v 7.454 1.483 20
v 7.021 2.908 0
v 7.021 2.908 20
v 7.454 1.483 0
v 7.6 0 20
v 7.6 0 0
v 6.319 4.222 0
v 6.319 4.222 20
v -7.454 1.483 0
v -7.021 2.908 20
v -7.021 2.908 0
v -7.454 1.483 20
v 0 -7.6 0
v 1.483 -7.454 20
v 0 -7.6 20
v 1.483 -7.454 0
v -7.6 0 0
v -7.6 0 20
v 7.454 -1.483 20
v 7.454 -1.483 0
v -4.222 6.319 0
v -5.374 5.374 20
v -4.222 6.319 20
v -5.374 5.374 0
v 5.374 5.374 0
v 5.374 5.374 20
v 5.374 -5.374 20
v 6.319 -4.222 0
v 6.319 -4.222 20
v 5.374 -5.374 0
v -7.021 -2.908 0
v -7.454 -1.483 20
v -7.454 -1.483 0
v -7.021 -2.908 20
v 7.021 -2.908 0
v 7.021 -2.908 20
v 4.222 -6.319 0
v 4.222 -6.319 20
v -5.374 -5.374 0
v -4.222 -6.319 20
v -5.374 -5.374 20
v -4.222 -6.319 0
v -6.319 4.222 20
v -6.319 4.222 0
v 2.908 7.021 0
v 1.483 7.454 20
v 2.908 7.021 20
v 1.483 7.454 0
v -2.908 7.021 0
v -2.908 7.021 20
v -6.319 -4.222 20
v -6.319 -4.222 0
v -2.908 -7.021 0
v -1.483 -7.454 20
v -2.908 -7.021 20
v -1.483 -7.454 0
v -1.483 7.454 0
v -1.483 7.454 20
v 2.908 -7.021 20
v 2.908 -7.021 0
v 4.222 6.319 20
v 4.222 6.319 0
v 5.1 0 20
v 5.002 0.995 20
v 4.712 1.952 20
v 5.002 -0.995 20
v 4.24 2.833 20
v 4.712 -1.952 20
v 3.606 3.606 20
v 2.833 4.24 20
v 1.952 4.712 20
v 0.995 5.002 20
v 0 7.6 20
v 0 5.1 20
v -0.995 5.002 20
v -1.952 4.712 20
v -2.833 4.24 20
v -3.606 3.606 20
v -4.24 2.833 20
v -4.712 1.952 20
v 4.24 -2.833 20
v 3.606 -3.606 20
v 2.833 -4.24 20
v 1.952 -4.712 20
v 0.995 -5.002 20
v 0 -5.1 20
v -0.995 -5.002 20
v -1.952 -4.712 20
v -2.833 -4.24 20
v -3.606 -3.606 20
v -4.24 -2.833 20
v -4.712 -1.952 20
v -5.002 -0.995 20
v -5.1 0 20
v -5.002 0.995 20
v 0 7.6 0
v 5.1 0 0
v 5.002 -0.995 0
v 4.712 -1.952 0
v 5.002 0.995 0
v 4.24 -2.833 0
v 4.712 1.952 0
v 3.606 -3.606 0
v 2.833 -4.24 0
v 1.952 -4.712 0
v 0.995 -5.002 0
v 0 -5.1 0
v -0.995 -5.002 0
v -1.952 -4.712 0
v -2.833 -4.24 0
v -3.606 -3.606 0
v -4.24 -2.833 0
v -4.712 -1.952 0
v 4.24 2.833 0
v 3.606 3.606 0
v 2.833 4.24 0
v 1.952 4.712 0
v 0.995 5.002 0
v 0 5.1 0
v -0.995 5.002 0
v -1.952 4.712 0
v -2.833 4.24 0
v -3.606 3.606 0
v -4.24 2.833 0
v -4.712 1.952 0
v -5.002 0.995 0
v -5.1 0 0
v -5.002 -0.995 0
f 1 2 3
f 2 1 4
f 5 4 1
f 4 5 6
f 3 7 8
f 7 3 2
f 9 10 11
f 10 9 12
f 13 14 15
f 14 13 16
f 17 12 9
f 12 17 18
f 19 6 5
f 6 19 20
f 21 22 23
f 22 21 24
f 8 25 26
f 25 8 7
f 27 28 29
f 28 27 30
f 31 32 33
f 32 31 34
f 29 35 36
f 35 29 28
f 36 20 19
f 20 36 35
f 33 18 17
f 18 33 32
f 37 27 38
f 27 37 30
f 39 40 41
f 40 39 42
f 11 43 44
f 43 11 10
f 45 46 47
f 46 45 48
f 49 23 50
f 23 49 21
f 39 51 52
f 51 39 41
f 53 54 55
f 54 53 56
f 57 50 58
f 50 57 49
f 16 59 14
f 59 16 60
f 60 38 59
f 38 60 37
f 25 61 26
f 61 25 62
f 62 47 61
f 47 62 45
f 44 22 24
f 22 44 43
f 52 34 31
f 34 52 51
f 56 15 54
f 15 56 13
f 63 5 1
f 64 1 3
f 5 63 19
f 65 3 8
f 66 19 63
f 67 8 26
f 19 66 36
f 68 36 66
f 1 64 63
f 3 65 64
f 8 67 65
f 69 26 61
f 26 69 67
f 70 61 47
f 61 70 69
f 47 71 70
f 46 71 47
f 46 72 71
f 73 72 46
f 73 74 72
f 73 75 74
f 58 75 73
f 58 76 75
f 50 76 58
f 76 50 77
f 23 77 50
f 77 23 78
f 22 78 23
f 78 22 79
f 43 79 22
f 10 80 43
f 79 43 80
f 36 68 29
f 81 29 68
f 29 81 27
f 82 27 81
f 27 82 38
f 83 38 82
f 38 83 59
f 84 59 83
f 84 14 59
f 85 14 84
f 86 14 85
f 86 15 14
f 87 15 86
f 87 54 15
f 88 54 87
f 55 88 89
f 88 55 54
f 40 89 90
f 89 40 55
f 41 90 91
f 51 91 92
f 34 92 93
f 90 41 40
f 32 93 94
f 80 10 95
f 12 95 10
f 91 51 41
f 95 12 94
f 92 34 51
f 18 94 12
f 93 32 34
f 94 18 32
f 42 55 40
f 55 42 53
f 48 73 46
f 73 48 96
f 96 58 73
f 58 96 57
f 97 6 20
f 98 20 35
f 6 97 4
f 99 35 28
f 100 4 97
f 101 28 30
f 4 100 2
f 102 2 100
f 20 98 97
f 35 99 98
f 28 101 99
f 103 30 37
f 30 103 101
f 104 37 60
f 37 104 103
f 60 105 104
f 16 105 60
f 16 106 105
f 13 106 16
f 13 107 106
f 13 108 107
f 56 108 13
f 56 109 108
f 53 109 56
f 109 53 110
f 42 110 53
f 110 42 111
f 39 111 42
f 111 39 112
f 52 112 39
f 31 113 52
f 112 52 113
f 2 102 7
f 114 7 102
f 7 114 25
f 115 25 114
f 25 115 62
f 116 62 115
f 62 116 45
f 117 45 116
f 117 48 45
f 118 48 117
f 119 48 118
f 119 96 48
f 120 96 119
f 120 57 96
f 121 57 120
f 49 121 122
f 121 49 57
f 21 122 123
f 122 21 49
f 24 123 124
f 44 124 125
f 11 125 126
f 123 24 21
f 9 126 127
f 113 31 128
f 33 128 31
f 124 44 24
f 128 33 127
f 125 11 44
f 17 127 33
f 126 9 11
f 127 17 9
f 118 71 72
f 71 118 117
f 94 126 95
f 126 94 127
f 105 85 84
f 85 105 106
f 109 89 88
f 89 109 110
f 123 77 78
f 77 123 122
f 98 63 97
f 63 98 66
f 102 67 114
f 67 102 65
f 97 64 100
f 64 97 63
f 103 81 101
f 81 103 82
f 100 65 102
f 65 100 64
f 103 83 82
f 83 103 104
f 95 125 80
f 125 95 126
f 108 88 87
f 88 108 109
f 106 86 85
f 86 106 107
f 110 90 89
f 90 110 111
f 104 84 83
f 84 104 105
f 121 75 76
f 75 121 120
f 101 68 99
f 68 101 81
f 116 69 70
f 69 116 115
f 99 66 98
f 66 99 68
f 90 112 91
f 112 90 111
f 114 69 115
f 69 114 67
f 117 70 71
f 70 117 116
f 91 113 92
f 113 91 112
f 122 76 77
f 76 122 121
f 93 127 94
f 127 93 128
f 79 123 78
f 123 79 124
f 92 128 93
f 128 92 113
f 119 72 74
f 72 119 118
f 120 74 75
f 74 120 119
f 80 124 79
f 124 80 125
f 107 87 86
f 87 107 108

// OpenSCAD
$fn = 32;

// ----------------------------------------------------------------------
// Spacer sleeve: 15.2 / 10.2 x 20 mm
// ----------------------------------------------------------------------

// --- parameters (mm) ---
sleeve_od = 15.2;         // outside diameter
sleeve_id = 10.2;         // shaft bore
sleeve_l = 20;            // sleeve length

module sleeve() {
  cylinder(h = sleeve_l, d = sleeve_od);
}

difference() {
  sleeve();
  translate([0, 0, -1]) cylinder(h = sleeve_l + 2, d = sleeve_id);
}
